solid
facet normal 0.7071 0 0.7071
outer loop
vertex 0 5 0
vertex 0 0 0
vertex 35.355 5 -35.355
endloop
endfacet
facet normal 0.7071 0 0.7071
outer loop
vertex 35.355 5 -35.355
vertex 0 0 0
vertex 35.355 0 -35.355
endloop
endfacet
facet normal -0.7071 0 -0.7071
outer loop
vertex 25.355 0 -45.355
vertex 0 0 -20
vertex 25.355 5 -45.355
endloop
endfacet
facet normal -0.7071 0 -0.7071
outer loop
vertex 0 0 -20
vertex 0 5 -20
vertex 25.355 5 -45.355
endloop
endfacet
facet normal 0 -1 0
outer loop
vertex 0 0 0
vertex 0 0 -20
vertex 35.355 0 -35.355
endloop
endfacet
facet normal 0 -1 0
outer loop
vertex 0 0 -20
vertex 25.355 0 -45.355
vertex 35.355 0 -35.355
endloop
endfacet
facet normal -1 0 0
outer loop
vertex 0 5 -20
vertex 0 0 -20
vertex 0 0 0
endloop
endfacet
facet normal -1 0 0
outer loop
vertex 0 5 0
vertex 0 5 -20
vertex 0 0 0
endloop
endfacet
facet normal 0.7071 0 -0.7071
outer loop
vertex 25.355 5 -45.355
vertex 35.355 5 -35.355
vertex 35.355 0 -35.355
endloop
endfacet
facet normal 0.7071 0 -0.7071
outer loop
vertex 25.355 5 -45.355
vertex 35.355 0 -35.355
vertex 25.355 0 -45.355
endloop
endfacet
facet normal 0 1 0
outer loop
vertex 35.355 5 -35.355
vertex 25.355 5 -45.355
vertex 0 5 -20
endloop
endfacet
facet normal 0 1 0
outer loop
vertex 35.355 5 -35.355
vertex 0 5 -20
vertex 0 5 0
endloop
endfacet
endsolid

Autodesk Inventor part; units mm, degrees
ref_plane "YZ Plane" through (0, 0, 0) normal (1, 0, 0) x (0, 1, 0)
ref_plane "XZ Plane" through (0, 0, 0) normal (0, 1, 0) x (-1, 0, 0)
ref_plane "XY Plane" through (0, 0, 0) normal (0, 0, 1) x (1, 0, 0)
sketch "Szkic3" plane through (0, 0, 0) normal (0, 1, 0) x (-1, 0, 0)
  line L0 (0, 0) -> (-20, 0)
  line L1 (-20, 0) -> (-20, -20)
  line L2 (-20, -20) -> (0, -20)
  line L3 (0, -20) -> (0, 0)
  dimension "d6" = 20
  dimension "d7" = 20
extrude "Wyciągnięcie proste3" add sketch "Szkic3" along normal blind 5
sketch "Szkic4" plane through (0, 0, 0) normal (0, -1, 0) x (1, 0, 0)
  line L0 (0, 0) -> (20, 0) projected
  line L1 (20, 0) -> (20, -20) projected
  line L2 (0, 0) -> (20, -20)
  line L3 (20, -20) -> (20, 0)
  line L4 (20, 0) -> (0, 0)
extrude "Wyciągnięcie proste4" cut sketch "Szkic4" against normal blind 5
sketch "Szkic5" plane through (0, 5, 0) normal (0, 1, 0) x (1, 0, 0)
  line L0 (20, 20) -> (0, 20) projected
  line L1 (0, 20) -> (25.3553, 45.3553)
  line L2 (0, 20) -> (35.8579, 20) construction
  line L3 (0, 0) -> (20, 20) projected
  line L4 (0, 0) -> (35.3553, 35.3553)
  line L5 (0, 0) -> (50, 0) construction
  line L6 (10.8927, 30.8927) -> (33.735, 53.735)
  line L7 (10.8927, 30.8927) -> (43.1966, 30.8927) construction
  line L8 (35.3553, 35.3553) -> (25.3553, 45.3553)
  dimension "d12" = 45
  dimension "d13" = 50
  dimension "d14" = 45
  dimension "d15" = 45
extrude "Wyciągnięcie proste5" add sketch "Szkic5" against normal blind 5
properties part number "Helenowiak_podpora"
